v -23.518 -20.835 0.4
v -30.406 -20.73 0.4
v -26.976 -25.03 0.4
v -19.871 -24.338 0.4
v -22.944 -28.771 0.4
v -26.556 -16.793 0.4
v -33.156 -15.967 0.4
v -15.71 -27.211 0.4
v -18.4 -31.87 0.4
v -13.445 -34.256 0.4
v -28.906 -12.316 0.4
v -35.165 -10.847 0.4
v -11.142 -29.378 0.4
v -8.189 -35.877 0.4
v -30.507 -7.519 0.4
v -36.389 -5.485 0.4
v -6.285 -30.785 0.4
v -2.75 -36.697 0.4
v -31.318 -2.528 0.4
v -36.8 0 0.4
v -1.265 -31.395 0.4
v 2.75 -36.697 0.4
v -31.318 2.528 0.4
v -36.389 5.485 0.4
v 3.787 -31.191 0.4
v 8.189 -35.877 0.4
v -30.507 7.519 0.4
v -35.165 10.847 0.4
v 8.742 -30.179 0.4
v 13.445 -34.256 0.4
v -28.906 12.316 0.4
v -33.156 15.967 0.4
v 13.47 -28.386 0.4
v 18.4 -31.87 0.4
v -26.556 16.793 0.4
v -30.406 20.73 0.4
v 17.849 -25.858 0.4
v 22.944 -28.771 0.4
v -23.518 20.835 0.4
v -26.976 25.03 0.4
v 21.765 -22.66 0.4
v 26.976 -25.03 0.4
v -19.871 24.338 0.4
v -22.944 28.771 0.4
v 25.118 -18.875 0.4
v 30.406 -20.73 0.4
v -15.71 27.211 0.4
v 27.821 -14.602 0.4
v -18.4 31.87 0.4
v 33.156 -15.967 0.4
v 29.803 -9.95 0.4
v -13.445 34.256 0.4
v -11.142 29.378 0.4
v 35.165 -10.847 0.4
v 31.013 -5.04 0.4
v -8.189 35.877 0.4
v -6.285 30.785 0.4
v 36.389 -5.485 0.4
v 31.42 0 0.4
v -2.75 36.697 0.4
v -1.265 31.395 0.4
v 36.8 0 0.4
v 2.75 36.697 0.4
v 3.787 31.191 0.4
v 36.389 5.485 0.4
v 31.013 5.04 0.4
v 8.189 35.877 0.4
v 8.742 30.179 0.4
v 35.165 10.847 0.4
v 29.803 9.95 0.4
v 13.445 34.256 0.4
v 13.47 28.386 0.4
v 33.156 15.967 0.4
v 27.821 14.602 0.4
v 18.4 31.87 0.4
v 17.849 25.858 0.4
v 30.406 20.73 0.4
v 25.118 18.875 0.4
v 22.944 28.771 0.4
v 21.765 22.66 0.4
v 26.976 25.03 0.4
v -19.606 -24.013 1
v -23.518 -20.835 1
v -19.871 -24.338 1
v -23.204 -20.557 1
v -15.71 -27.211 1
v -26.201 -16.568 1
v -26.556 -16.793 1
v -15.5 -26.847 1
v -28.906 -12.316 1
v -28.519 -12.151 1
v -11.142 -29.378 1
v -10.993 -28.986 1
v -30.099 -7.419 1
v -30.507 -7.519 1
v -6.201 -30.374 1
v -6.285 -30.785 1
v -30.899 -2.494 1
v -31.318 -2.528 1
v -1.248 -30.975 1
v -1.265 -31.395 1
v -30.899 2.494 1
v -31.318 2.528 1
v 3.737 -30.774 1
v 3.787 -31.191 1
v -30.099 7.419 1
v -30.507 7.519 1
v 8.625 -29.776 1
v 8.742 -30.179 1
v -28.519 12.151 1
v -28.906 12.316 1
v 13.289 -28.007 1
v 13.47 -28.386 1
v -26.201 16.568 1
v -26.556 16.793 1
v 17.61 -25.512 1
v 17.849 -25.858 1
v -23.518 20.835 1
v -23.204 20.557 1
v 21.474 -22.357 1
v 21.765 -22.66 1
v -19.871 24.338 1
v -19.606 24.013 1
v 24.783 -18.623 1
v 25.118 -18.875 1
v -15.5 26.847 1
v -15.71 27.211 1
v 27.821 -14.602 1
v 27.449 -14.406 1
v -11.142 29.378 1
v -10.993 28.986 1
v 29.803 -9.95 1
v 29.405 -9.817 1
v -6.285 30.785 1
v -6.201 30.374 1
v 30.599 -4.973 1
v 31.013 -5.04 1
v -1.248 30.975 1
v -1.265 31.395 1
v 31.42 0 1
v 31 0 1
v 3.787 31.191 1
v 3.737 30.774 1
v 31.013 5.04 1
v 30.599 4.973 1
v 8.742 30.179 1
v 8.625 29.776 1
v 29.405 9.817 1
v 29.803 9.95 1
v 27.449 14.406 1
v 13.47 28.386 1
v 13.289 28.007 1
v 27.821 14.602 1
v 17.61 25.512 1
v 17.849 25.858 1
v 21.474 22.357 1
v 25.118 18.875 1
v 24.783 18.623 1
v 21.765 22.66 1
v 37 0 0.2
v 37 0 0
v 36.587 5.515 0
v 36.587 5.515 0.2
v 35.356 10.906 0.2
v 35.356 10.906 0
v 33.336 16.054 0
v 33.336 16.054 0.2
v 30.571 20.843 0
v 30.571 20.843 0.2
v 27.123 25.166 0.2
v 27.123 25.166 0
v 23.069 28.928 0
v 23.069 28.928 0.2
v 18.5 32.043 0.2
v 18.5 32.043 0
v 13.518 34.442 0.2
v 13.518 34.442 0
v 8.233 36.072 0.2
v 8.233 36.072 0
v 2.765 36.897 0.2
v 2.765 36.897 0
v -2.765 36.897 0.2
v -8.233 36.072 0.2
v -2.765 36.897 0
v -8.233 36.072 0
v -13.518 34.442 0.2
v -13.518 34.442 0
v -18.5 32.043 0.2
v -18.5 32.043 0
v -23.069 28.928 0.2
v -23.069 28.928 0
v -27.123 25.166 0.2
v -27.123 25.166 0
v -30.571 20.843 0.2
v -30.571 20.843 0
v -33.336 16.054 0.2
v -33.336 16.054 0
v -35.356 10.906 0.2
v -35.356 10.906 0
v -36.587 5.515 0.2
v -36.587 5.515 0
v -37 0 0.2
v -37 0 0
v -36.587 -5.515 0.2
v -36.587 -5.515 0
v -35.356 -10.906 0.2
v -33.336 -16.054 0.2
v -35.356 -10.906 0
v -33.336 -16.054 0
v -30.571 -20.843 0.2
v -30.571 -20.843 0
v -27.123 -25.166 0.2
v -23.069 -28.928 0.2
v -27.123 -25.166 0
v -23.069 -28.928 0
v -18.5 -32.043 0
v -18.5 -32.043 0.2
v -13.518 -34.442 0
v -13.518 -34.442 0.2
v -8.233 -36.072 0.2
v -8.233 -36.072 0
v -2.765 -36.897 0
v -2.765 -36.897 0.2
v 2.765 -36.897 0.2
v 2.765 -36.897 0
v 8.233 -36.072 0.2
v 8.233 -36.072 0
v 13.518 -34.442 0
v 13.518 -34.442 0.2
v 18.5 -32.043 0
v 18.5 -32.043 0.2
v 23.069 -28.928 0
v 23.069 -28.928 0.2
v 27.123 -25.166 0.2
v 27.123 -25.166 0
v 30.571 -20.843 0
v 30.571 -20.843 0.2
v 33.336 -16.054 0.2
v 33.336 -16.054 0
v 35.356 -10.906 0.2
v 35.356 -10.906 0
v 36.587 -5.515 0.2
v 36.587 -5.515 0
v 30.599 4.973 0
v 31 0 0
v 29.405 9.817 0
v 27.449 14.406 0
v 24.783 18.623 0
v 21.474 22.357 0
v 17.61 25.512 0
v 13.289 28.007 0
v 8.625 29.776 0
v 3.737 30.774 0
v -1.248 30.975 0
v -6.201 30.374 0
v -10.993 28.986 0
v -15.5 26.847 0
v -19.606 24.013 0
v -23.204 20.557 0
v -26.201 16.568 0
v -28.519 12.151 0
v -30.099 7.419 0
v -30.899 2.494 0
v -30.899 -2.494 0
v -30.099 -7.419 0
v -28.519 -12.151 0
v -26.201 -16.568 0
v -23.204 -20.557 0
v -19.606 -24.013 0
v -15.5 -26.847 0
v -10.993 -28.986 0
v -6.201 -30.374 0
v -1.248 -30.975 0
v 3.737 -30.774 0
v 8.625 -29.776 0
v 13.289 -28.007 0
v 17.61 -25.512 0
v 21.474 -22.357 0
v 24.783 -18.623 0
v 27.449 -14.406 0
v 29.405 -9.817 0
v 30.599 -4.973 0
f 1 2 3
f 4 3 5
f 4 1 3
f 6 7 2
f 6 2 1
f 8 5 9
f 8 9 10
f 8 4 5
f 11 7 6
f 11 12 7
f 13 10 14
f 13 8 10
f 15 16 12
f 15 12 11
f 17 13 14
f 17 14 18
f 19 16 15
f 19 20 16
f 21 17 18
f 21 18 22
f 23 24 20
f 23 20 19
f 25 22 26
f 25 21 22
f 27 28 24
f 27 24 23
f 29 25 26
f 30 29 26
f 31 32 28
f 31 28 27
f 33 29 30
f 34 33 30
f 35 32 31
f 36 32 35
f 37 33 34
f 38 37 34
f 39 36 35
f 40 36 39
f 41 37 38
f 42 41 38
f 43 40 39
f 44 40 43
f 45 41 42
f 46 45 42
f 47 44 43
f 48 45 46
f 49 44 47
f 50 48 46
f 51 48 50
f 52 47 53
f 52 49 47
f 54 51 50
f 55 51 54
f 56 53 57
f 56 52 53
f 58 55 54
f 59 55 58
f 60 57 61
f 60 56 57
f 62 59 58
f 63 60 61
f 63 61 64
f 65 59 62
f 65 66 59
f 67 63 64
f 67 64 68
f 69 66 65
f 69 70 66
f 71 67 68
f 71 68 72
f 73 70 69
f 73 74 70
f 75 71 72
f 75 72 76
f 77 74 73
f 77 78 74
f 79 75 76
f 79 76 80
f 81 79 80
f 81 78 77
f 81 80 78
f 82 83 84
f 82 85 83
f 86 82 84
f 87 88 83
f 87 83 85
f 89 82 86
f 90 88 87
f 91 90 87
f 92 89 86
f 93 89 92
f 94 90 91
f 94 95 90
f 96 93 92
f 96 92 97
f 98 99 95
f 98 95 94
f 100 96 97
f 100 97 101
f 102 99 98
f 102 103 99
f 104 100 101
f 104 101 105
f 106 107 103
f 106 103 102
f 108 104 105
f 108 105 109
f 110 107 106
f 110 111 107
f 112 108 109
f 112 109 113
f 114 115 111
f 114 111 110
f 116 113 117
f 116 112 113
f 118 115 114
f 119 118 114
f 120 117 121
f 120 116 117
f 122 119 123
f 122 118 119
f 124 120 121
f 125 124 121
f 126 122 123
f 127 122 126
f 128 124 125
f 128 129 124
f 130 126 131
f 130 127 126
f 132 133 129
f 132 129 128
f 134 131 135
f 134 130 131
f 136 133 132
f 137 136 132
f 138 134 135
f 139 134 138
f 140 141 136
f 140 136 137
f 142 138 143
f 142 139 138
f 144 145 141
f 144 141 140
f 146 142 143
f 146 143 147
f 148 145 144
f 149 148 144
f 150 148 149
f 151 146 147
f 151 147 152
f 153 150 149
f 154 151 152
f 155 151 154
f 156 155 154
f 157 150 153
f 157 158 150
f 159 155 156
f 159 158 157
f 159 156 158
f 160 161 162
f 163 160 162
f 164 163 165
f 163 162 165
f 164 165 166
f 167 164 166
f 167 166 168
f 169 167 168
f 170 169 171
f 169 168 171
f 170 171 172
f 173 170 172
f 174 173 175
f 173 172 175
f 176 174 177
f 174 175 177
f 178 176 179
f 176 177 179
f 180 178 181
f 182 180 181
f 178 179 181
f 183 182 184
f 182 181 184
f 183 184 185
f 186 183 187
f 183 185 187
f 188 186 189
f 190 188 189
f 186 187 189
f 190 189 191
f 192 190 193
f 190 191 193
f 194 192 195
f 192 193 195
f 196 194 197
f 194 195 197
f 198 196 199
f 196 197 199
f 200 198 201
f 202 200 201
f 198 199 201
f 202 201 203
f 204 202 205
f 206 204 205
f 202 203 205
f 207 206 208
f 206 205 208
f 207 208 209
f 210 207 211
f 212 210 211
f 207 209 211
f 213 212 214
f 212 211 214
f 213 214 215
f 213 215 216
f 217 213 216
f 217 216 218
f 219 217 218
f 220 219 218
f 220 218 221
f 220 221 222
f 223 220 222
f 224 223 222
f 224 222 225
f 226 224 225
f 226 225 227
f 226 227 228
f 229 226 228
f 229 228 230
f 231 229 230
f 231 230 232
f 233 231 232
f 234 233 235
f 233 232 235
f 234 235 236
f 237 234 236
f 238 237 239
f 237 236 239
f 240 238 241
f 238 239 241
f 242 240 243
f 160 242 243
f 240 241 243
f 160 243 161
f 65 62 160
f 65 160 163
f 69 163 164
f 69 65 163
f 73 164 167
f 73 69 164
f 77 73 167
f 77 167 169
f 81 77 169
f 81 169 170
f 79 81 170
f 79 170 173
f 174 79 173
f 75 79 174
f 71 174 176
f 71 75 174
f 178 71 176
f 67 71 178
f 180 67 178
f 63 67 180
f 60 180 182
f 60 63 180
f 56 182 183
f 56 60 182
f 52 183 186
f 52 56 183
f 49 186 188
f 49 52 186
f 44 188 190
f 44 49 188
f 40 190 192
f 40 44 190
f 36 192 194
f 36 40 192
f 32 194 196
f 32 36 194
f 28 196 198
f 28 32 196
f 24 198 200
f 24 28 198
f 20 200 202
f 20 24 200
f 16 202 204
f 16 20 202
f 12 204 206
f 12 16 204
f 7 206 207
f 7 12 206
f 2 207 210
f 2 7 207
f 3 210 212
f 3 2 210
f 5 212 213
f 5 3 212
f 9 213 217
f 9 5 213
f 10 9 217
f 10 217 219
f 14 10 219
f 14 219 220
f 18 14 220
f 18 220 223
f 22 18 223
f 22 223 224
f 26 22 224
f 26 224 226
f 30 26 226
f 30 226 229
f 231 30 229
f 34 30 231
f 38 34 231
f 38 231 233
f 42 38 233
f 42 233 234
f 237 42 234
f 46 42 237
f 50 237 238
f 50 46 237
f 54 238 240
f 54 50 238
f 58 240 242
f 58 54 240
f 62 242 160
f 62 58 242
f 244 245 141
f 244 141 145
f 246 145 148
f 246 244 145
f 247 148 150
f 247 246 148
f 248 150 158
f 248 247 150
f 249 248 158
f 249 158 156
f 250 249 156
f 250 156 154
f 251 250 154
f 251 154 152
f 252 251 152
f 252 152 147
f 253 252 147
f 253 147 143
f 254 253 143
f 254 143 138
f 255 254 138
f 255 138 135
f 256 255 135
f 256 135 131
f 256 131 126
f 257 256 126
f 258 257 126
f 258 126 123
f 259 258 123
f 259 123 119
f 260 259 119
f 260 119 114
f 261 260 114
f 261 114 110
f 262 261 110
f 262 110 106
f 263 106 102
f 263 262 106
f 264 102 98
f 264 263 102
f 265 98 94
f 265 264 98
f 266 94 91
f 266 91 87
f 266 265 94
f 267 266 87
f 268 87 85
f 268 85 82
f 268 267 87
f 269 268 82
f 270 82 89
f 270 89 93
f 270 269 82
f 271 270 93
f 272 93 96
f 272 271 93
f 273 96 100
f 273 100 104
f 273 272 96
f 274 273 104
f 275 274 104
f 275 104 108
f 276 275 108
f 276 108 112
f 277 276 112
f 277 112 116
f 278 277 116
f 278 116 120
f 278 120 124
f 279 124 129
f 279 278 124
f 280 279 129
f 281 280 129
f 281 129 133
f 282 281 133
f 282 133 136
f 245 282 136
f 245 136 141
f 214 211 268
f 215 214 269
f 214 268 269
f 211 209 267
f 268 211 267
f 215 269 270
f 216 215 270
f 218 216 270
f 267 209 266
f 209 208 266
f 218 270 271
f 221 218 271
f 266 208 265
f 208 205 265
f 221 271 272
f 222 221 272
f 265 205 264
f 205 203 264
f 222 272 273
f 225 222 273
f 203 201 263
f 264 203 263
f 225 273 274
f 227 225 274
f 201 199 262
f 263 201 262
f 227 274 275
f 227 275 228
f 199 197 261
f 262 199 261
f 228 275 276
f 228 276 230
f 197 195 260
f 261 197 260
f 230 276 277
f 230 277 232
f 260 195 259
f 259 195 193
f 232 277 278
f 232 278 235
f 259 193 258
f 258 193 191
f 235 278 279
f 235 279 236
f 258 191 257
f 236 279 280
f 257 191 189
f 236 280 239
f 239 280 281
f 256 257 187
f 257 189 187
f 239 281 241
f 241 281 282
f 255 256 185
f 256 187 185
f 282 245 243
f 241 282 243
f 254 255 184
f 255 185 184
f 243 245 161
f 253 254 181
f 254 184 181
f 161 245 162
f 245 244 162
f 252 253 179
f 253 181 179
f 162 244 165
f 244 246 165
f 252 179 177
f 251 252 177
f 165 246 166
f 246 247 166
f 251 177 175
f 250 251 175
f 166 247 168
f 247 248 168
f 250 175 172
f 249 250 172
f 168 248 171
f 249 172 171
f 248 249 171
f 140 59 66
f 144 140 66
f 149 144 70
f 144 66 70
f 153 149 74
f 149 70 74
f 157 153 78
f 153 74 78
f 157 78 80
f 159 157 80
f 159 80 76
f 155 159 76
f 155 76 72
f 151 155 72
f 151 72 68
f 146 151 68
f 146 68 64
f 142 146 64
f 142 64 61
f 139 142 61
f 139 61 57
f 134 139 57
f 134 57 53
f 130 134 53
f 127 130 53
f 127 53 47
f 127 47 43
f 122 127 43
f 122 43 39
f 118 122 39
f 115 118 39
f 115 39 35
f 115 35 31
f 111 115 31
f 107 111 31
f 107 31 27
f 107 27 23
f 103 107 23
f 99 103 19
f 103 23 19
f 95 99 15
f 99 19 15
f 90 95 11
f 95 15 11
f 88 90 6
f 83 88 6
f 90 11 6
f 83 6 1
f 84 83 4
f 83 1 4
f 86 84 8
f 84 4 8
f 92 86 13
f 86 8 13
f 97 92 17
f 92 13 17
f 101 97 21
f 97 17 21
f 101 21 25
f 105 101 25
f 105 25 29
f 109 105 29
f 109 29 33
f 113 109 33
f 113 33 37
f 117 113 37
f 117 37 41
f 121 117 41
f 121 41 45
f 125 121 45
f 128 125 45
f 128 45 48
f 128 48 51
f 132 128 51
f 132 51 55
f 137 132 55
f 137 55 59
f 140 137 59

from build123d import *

# Parameters (mm, degrees)
F0_R     = 37
F0_R_2   = 31.42
F0_R_3   = 31
F1_DEPTH = 0.4
F2_DEPTH = 1
F3_SIZE  = 0.2


with BuildPart() as f1:
    # F0 (on Top) → F1 (new body)
    with BuildSketch(Plane.XY):
        Circle(F0_R)
        Circle(F0_R_2, mode=Mode.SUBTRACT)
        Circle(F0_R_2)
        Circle(F0_R_3, mode=Mode.SUBTRACT)
    extrude(amount=F1_DEPTH)

    # F0 (on Top) → F2 (join)
    with BuildSketch(Plane.XY):
        Circle(F0_R_2)
        Circle(F0_R_3, mode=Mode.SUBTRACT)
    extrude(amount=F2_DEPTH)

    # F3
    f3_edges = [f1.edges().sort_by_distance(p)[0] for p in [
        (-37, 0, 0.4),
    ]]
    chamfer(f3_edges, length=F3_SIZE)


solid = f1.part
